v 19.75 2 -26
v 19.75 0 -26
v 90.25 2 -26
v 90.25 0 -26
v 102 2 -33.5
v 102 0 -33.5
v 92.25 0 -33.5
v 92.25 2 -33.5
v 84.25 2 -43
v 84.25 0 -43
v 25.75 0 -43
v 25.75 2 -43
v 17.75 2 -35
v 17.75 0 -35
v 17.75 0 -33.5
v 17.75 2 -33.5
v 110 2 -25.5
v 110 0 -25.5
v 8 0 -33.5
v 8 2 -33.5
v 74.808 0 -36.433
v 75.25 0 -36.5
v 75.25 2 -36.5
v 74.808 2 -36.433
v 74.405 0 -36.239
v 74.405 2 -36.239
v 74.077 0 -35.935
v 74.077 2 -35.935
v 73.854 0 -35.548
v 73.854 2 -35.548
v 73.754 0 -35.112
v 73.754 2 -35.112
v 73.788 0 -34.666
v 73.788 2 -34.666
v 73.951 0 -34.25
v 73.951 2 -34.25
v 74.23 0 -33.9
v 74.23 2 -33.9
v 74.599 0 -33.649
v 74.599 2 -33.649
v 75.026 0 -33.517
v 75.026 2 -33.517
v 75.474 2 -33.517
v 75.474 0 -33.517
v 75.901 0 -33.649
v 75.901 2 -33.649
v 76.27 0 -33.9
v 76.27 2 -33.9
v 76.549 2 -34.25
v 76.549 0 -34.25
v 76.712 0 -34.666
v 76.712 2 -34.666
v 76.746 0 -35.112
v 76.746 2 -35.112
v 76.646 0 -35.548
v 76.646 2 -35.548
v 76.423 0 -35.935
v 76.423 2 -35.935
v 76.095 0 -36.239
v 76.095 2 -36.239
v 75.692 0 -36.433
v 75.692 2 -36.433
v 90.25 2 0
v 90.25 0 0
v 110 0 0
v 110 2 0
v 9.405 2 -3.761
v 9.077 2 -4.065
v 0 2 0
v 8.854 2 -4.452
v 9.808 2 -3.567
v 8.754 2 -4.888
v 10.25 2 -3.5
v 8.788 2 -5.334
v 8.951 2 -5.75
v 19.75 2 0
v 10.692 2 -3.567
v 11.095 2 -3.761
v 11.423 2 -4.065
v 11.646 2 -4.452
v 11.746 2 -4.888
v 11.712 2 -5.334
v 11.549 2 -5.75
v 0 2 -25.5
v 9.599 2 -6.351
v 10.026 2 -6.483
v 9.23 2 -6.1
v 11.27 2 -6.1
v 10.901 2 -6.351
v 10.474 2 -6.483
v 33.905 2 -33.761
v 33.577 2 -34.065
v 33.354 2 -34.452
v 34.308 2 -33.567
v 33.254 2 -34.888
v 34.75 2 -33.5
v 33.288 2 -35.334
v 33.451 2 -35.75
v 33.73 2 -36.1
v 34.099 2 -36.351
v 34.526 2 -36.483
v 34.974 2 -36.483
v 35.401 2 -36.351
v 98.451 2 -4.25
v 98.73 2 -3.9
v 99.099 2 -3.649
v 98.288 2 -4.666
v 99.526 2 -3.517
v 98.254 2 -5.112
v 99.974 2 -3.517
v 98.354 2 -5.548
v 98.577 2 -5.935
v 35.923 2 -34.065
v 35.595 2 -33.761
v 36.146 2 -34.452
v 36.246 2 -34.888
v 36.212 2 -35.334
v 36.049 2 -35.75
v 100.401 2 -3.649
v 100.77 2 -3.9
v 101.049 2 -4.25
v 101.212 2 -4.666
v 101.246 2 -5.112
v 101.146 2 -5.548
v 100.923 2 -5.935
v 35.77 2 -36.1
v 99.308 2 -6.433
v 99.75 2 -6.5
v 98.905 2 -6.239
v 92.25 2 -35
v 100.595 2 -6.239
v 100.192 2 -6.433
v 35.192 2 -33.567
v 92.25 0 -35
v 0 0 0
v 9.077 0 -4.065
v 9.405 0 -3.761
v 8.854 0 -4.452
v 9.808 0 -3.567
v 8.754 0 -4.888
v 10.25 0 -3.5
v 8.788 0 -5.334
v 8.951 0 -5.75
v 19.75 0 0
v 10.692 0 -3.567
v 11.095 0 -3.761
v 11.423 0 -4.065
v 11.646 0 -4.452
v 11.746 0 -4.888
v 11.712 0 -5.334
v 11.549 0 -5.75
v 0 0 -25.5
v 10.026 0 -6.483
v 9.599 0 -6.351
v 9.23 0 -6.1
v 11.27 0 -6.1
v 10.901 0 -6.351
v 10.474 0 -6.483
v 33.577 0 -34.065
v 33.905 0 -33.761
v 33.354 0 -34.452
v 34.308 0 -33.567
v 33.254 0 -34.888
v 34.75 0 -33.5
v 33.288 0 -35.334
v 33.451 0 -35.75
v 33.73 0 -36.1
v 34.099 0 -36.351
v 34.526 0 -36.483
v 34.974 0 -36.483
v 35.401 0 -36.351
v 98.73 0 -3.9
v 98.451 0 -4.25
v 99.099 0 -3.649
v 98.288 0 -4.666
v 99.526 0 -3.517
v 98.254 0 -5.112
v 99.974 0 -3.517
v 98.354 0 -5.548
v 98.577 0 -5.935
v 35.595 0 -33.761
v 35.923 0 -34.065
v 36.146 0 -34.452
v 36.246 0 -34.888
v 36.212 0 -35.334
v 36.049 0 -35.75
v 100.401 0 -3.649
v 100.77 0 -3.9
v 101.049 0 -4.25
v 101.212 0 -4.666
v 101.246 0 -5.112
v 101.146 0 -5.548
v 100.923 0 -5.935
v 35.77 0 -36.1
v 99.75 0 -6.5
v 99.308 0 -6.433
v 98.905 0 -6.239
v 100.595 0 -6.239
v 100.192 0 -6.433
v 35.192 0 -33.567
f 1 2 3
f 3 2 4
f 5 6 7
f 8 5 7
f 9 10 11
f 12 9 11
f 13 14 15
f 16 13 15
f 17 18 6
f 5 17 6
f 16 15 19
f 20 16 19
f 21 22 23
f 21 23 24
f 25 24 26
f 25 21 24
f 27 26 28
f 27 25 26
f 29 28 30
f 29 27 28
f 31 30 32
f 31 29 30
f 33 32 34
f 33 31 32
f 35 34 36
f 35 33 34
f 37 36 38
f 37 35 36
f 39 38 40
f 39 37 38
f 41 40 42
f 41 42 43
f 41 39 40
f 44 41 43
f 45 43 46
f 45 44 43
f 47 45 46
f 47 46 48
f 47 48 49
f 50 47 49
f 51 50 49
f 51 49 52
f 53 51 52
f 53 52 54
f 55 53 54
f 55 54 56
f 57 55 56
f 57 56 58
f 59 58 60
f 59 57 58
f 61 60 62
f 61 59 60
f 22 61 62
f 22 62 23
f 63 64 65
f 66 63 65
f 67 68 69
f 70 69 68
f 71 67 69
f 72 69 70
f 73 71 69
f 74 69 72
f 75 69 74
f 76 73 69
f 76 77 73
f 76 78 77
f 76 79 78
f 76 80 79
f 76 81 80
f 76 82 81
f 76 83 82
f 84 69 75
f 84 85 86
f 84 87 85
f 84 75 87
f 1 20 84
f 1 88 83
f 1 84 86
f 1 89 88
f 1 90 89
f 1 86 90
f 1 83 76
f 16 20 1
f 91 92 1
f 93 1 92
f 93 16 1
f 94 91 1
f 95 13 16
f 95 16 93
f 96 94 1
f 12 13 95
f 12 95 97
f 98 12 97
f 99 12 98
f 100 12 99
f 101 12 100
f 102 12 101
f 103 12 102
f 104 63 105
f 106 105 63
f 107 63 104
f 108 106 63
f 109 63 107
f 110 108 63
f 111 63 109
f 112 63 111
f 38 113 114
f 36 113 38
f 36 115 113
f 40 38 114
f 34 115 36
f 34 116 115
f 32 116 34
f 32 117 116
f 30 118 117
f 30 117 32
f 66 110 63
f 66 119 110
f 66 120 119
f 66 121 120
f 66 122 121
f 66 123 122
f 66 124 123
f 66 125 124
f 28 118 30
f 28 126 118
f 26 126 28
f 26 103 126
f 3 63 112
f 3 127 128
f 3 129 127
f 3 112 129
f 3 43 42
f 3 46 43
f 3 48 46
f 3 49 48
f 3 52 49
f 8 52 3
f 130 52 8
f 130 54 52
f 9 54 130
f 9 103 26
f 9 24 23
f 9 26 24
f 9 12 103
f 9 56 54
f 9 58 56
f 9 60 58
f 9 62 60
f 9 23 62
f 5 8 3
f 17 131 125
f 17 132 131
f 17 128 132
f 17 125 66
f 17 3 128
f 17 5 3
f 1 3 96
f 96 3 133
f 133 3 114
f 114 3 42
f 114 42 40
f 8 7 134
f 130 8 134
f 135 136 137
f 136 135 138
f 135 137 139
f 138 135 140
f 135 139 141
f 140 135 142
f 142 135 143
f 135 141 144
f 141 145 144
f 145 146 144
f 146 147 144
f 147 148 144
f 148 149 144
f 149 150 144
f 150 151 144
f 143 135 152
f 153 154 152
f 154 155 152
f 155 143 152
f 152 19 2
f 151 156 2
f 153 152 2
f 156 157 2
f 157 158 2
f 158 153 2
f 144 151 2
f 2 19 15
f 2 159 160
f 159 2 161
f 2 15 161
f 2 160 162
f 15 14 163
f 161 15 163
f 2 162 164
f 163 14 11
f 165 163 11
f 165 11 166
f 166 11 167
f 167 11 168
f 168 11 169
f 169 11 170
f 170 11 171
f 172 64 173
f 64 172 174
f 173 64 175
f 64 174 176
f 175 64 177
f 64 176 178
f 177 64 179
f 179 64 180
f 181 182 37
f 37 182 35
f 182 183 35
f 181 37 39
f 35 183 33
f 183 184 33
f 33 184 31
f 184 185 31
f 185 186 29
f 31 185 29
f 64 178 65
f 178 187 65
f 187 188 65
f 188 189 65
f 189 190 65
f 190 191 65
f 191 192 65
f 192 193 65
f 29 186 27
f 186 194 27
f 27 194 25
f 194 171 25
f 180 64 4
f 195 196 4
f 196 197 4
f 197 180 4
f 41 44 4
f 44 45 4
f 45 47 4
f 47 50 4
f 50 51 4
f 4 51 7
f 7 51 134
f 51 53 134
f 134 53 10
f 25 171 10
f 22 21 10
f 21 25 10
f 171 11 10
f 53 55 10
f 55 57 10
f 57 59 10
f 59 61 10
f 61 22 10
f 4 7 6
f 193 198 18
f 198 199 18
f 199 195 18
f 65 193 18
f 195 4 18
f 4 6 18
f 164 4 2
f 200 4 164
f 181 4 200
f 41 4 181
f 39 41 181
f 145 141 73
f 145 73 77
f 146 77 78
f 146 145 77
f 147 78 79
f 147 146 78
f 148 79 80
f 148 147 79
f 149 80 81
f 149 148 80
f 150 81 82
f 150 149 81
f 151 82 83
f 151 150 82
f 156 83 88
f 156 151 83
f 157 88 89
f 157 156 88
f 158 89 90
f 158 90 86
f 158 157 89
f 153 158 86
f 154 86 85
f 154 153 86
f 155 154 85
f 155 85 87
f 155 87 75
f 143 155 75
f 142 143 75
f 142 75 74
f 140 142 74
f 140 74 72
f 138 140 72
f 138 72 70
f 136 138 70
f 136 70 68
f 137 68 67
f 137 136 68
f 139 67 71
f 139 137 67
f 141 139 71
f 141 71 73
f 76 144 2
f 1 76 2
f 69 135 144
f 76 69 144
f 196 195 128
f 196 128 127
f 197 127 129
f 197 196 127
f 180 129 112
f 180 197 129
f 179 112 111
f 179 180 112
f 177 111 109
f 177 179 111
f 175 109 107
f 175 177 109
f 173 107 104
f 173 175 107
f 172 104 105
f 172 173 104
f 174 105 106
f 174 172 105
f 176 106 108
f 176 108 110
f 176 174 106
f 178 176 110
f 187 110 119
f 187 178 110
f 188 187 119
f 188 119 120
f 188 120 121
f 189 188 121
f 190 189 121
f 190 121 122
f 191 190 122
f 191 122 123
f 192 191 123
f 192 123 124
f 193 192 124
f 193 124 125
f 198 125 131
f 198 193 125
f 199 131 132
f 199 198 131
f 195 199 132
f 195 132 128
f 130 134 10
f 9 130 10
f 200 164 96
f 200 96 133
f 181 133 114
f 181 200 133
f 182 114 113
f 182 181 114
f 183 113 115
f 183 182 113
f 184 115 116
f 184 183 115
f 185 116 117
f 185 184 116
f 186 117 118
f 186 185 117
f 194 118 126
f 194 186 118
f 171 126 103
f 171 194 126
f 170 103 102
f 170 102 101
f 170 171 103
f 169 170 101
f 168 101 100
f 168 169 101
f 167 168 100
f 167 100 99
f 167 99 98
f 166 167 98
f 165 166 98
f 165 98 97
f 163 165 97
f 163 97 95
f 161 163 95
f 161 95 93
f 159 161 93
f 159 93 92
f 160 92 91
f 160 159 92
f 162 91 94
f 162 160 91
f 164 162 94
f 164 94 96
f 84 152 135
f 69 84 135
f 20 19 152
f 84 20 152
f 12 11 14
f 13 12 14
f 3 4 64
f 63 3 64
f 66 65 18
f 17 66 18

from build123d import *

# Parameters (mm, degrees)
SKETCH1_R           = 1.5
BOSS_EXTRUDE1_DEPTH = 2


with BuildPart() as part:
    # Sketch1 → Boss-Extrude1 (new body)
    with BuildSketch(Plane(origin=(0, 0, 0), x_dir=(1, 0, 0), z_dir=(0, 1, 0))):
        Polygon((0, 0), (19.75, 0), (19.75, 26), (90.25, 26), (90.25, 0), (110, 0), (110, 25.5), (102, 33.5), (92.25, 33.5), (92.25, 35), (84.25, 43), (25.75, 43), (17.75, 35), (17.75, 33.5), (8, 33.5), (0, 25.5), align=None)
        with Locations(Location((10.25, 5, 0), (0, 0, 270))):
            Circle(SKETCH1_R, mode=Mode.SUBTRACT)
        with Locations(Location((34.75, 35, 0), (0, 0, 270))):
            Circle(SKETCH1_R, mode=Mode.SUBTRACT)
        with Locations(Location((75.25, 35, 0), (0, 0, 90))):
            Circle(SKETCH1_R, mode=Mode.SUBTRACT)
        with Locations(Location((99.75, 5, 0), (0, 0, 90))):
            Circle(SKETCH1_R, mode=Mode.SUBTRACT)
    extrude(amount=BOSS_EXTRUDE1_DEPTH)


solid = part.part
